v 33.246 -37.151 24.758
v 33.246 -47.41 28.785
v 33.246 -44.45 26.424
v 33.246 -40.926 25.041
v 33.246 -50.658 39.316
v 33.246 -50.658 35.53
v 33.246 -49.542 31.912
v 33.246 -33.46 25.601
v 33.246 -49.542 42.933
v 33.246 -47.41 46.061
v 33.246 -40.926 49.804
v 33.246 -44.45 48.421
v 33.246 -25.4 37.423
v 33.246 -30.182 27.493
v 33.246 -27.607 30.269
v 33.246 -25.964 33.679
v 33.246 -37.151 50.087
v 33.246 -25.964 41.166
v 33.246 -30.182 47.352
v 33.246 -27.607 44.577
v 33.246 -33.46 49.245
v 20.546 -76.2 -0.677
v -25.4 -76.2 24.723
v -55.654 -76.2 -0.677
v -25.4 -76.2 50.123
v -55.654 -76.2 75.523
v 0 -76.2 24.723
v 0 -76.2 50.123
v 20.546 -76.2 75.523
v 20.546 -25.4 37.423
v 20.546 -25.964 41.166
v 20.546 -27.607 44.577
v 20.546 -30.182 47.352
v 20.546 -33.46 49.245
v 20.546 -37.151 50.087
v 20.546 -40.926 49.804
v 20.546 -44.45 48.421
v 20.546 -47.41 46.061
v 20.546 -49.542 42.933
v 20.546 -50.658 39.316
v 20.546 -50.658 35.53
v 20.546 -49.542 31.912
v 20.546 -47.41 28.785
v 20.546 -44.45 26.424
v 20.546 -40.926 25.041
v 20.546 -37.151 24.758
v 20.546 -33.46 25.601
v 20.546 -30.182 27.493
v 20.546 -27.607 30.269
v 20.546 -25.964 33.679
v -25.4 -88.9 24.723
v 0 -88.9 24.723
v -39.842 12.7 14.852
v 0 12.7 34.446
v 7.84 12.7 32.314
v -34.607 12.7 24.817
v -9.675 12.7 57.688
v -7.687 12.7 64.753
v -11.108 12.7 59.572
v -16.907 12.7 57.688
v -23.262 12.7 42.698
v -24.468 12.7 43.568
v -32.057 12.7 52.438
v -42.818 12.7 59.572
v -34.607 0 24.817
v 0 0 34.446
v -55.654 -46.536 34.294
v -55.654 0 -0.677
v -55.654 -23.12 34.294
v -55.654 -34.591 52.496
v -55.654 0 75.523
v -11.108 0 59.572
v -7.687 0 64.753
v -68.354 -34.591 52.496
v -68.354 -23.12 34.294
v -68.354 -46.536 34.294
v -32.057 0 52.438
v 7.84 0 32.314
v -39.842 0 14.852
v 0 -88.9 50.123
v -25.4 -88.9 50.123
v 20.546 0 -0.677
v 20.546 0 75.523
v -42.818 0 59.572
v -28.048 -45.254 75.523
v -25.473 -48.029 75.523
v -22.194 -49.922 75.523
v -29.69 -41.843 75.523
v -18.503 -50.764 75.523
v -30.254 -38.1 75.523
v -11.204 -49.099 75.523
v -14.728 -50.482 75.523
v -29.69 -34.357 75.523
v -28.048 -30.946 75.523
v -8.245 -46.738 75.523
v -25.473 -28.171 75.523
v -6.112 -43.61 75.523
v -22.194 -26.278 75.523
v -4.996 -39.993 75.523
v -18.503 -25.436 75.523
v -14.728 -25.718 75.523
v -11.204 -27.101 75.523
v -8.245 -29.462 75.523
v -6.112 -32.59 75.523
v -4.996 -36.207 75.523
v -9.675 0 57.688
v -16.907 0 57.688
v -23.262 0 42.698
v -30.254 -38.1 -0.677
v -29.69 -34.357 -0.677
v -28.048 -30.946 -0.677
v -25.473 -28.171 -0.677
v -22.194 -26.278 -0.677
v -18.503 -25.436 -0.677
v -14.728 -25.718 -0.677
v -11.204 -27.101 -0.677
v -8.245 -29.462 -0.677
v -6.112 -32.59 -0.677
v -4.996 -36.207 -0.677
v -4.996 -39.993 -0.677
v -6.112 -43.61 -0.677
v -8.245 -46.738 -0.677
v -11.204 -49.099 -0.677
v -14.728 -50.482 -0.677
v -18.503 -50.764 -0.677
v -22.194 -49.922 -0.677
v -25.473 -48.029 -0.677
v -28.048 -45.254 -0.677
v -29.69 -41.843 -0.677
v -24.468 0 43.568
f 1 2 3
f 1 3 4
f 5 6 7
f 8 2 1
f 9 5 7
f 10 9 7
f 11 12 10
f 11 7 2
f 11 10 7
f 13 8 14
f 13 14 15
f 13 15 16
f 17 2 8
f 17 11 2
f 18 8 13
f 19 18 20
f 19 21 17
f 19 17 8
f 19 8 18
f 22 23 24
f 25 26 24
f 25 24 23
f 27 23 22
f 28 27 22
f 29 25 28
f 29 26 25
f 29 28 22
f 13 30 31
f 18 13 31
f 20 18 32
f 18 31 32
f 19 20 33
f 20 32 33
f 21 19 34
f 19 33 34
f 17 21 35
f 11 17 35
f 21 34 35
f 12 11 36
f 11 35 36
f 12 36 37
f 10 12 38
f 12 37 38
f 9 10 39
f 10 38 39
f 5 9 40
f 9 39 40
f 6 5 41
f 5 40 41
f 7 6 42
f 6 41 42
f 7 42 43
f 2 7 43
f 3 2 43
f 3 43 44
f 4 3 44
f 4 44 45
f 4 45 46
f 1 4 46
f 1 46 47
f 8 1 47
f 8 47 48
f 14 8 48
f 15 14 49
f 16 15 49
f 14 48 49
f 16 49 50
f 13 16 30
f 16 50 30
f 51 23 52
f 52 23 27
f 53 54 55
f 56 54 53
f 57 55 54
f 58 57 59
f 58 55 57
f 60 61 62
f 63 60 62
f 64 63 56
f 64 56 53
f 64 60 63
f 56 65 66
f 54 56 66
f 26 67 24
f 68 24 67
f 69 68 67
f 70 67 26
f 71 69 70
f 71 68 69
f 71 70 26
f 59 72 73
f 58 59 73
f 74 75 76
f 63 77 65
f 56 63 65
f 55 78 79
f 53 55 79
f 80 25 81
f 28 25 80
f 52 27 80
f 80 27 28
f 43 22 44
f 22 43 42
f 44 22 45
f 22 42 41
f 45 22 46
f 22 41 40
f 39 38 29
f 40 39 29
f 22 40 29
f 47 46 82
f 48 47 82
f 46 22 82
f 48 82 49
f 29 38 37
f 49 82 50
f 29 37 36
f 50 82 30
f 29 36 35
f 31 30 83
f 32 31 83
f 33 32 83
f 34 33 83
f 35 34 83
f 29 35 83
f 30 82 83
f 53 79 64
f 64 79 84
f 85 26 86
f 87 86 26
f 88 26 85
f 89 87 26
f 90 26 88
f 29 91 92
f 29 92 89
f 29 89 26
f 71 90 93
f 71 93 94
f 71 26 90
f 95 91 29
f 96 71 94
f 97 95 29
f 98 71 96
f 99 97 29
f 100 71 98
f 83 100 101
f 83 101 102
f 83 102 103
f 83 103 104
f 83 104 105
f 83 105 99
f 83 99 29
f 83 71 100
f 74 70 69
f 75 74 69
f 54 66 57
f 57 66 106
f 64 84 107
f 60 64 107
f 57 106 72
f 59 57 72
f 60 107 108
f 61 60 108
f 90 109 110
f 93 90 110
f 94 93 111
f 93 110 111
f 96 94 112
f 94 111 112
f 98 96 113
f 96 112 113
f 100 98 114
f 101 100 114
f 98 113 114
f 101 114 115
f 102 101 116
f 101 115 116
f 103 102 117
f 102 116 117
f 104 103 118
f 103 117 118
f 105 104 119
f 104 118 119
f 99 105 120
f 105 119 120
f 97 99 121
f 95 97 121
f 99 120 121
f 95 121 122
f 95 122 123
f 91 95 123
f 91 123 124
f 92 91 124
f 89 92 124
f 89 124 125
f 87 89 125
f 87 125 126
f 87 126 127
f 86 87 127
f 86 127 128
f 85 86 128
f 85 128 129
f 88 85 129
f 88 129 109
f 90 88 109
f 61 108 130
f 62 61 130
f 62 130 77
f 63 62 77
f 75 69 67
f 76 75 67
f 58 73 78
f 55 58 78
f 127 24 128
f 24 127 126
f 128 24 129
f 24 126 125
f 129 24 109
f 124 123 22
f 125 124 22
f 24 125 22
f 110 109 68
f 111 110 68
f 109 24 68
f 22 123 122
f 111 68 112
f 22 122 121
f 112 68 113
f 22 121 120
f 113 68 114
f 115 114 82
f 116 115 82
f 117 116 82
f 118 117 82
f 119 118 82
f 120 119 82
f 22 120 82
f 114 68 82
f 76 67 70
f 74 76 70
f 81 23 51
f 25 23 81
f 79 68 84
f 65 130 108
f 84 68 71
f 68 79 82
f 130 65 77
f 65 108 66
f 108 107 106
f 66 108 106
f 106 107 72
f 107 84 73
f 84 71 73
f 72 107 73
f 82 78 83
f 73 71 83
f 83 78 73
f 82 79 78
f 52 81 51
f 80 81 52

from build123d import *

# Parameters (mm, degrees)
F0_W      = 76.2
F0_H      = 76.2
F1_DEPTH  = 76.2
F2_W      = 25.4
F2_H      = 25.4
F3_DEPTH  = 12.7
F4_R      = 12.7
F5_DEPTH  = 12.7
F7_D      = 25.4
F9_DEPTH  = 12.7
F11_DEPTH = 12.7


with BuildPart() as f1:
    # F0 (on Front) → F1 (new body)
    with BuildSketch(Plane.XZ):
        with Locations((-17.554368, 37.4227)):
            Rectangle(F0_W, F0_H)
    extrude(amount=F1_DEPTH)

    # F2 (on face) → F3 (join)
    with BuildSketch(Plane.XZ.offset(76.2)):
        with Locations((-12.7, 37.4227)):
            Rectangle(F2_W, F2_H)
    extrude(amount=F3_DEPTH)

    # F4 (on face) → F5 (join)
    with BuildSketch(Plane.YZ.offset(20.545632)):
        with Locations((-38.1, 37.4227)):
            Circle(F4_R)
    extrude(amount=F5_DEPTH)

    # F7 (through all)
    with Locations(Plane.XY.offset(75.5227)):
        with Locations((-17.554368, -38.1)):
            Hole(F7_D / 2)

    # F8 (on face) → F9 (join)
    with BuildSketch(Plane(origin=(-55.654368, 0, 0), x_dir=(0, -1, 0), z_dir=(-1, 0, 0))):
        Polygon((46.53557, 34.294344), (34.590948, 52.495673), (23.120321, 34.294344), align=None)
    extrude(amount=F9_DEPTH)

    # F10 (on face) → F11 (join)
    with BuildSketch(Plane(origin=(0, 0, 0), x_dir=(-1, 0, 0), z_dir=(0, 1, 0))):
        Polygon((9.674511, 57.68837), (11.108014, 59.571687), (7.686859, 64.753473), (-7.840106, 32.313734), (39.842051, 14.852335), (42.817518, 59.571687), (16.907275, 57.68837), (23.262199, 42.698413), (24.467854, 43.567646), (32.056715, 52.438211), (34.606893, 24.81661), (0, 34.446057), align=None)
    extrude(amount=F11_DEPTH)


solid = f1.part
